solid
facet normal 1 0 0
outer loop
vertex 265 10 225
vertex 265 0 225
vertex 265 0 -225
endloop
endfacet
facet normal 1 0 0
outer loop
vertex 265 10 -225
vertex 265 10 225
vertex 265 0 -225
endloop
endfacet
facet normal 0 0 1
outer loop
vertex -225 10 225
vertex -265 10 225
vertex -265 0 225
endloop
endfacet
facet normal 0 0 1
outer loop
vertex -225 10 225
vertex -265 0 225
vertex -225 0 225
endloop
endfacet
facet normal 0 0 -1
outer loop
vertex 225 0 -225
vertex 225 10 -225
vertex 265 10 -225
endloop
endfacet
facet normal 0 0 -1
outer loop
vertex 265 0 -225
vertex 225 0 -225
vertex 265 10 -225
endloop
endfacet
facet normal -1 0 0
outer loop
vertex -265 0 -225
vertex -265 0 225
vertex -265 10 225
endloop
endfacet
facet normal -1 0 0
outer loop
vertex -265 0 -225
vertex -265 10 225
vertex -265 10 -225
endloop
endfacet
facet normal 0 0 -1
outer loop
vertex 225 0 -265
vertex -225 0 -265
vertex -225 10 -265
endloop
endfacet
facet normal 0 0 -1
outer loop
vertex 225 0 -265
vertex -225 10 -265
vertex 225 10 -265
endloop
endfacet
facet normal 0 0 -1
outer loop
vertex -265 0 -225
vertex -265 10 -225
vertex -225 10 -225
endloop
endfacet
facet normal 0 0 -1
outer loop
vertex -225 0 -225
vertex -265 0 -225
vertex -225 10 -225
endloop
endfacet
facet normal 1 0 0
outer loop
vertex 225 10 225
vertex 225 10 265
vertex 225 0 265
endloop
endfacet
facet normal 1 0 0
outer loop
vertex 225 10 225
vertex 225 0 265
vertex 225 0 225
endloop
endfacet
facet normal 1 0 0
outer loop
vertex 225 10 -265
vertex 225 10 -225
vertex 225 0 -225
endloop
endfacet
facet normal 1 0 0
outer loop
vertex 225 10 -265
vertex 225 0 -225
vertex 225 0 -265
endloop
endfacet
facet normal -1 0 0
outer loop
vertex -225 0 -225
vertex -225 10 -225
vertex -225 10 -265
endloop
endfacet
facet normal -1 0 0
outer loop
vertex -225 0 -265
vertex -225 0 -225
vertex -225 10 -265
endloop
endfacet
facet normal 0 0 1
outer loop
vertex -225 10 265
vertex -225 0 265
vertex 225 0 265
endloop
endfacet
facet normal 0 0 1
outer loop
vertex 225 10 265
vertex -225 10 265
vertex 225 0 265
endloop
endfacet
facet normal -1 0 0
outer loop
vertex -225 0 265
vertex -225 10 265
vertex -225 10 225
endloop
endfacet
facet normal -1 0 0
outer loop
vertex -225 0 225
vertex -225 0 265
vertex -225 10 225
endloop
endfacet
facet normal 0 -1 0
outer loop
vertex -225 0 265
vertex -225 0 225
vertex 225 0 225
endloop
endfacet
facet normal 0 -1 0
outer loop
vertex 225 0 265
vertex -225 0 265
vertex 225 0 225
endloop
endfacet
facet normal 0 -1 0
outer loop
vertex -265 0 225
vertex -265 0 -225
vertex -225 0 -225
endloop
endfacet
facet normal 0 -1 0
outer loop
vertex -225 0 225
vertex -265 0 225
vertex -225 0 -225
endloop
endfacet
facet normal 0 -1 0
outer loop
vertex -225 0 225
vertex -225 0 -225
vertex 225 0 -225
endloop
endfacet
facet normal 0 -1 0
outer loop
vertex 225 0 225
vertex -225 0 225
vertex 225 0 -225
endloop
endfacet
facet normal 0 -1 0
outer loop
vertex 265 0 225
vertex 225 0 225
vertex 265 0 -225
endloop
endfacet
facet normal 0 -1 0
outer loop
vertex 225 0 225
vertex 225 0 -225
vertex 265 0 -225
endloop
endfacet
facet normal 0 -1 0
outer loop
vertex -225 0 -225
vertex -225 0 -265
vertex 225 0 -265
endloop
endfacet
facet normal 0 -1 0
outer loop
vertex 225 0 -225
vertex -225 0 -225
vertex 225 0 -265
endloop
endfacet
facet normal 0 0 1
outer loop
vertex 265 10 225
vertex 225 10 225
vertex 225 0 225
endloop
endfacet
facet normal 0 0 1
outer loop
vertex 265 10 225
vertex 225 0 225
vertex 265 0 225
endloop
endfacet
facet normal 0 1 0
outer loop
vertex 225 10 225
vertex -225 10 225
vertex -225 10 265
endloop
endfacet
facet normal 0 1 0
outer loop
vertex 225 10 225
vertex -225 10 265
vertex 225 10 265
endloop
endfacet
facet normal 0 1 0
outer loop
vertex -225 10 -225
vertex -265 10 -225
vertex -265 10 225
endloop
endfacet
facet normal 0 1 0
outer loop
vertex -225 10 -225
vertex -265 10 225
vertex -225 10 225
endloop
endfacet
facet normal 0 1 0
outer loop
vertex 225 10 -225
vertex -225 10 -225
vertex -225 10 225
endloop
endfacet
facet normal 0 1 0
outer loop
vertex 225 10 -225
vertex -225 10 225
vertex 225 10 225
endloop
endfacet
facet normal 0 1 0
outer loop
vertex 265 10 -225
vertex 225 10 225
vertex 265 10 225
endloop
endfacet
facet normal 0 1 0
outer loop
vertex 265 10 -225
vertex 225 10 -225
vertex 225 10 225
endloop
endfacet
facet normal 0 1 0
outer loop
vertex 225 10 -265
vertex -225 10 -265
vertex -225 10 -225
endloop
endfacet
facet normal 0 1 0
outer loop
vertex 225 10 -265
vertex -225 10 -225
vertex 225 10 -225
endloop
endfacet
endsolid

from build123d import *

# Parameters (mm, degrees)
SKETCH1_W           = 530
SKETCH1_H           = 530
BOSS_EXTRUDE1_DEPTH = 10
SKETCH2_W           = 40
SKETCH2_H           = 40
CUT_EXTRUDE1_DEPTH  = 11


with BuildPart() as part:
    # Sketch1 → Boss-Extrude1 (new body)
    with BuildSketch(Plane(origin=(0, 0, 0), x_dir=(1, 0, 0), z_dir=(0, 1, 0))):
        Rectangle(SKETCH1_W, SKETCH1_H)
    extrude(amount=BOSS_EXTRUDE1_DEPTH)

    # Sketch2 → Cut-Extrude1 (cut, through all)
    with BuildSketch(Plane(origin=(0, 10, 0), x_dir=(1, 0, 0), z_dir=(0, 1, 0))):
        with Locations((-245, 245)):
            Rectangle(SKETCH2_W, SKETCH2_H)
        with Locations((245, 245)):
            Rectangle(SKETCH2_W, SKETCH2_H)
        with Locations((-245, -245)):
            Rectangle(SKETCH2_W, SKETCH2_H)
        with Locations((245, -245)):
            Rectangle(SKETCH2_W, SKETCH2_H)
    extrude(amount=-CUT_EXTRUDE1_DEPTH, mode=Mode.SUBTRACT)


solid = part.part
